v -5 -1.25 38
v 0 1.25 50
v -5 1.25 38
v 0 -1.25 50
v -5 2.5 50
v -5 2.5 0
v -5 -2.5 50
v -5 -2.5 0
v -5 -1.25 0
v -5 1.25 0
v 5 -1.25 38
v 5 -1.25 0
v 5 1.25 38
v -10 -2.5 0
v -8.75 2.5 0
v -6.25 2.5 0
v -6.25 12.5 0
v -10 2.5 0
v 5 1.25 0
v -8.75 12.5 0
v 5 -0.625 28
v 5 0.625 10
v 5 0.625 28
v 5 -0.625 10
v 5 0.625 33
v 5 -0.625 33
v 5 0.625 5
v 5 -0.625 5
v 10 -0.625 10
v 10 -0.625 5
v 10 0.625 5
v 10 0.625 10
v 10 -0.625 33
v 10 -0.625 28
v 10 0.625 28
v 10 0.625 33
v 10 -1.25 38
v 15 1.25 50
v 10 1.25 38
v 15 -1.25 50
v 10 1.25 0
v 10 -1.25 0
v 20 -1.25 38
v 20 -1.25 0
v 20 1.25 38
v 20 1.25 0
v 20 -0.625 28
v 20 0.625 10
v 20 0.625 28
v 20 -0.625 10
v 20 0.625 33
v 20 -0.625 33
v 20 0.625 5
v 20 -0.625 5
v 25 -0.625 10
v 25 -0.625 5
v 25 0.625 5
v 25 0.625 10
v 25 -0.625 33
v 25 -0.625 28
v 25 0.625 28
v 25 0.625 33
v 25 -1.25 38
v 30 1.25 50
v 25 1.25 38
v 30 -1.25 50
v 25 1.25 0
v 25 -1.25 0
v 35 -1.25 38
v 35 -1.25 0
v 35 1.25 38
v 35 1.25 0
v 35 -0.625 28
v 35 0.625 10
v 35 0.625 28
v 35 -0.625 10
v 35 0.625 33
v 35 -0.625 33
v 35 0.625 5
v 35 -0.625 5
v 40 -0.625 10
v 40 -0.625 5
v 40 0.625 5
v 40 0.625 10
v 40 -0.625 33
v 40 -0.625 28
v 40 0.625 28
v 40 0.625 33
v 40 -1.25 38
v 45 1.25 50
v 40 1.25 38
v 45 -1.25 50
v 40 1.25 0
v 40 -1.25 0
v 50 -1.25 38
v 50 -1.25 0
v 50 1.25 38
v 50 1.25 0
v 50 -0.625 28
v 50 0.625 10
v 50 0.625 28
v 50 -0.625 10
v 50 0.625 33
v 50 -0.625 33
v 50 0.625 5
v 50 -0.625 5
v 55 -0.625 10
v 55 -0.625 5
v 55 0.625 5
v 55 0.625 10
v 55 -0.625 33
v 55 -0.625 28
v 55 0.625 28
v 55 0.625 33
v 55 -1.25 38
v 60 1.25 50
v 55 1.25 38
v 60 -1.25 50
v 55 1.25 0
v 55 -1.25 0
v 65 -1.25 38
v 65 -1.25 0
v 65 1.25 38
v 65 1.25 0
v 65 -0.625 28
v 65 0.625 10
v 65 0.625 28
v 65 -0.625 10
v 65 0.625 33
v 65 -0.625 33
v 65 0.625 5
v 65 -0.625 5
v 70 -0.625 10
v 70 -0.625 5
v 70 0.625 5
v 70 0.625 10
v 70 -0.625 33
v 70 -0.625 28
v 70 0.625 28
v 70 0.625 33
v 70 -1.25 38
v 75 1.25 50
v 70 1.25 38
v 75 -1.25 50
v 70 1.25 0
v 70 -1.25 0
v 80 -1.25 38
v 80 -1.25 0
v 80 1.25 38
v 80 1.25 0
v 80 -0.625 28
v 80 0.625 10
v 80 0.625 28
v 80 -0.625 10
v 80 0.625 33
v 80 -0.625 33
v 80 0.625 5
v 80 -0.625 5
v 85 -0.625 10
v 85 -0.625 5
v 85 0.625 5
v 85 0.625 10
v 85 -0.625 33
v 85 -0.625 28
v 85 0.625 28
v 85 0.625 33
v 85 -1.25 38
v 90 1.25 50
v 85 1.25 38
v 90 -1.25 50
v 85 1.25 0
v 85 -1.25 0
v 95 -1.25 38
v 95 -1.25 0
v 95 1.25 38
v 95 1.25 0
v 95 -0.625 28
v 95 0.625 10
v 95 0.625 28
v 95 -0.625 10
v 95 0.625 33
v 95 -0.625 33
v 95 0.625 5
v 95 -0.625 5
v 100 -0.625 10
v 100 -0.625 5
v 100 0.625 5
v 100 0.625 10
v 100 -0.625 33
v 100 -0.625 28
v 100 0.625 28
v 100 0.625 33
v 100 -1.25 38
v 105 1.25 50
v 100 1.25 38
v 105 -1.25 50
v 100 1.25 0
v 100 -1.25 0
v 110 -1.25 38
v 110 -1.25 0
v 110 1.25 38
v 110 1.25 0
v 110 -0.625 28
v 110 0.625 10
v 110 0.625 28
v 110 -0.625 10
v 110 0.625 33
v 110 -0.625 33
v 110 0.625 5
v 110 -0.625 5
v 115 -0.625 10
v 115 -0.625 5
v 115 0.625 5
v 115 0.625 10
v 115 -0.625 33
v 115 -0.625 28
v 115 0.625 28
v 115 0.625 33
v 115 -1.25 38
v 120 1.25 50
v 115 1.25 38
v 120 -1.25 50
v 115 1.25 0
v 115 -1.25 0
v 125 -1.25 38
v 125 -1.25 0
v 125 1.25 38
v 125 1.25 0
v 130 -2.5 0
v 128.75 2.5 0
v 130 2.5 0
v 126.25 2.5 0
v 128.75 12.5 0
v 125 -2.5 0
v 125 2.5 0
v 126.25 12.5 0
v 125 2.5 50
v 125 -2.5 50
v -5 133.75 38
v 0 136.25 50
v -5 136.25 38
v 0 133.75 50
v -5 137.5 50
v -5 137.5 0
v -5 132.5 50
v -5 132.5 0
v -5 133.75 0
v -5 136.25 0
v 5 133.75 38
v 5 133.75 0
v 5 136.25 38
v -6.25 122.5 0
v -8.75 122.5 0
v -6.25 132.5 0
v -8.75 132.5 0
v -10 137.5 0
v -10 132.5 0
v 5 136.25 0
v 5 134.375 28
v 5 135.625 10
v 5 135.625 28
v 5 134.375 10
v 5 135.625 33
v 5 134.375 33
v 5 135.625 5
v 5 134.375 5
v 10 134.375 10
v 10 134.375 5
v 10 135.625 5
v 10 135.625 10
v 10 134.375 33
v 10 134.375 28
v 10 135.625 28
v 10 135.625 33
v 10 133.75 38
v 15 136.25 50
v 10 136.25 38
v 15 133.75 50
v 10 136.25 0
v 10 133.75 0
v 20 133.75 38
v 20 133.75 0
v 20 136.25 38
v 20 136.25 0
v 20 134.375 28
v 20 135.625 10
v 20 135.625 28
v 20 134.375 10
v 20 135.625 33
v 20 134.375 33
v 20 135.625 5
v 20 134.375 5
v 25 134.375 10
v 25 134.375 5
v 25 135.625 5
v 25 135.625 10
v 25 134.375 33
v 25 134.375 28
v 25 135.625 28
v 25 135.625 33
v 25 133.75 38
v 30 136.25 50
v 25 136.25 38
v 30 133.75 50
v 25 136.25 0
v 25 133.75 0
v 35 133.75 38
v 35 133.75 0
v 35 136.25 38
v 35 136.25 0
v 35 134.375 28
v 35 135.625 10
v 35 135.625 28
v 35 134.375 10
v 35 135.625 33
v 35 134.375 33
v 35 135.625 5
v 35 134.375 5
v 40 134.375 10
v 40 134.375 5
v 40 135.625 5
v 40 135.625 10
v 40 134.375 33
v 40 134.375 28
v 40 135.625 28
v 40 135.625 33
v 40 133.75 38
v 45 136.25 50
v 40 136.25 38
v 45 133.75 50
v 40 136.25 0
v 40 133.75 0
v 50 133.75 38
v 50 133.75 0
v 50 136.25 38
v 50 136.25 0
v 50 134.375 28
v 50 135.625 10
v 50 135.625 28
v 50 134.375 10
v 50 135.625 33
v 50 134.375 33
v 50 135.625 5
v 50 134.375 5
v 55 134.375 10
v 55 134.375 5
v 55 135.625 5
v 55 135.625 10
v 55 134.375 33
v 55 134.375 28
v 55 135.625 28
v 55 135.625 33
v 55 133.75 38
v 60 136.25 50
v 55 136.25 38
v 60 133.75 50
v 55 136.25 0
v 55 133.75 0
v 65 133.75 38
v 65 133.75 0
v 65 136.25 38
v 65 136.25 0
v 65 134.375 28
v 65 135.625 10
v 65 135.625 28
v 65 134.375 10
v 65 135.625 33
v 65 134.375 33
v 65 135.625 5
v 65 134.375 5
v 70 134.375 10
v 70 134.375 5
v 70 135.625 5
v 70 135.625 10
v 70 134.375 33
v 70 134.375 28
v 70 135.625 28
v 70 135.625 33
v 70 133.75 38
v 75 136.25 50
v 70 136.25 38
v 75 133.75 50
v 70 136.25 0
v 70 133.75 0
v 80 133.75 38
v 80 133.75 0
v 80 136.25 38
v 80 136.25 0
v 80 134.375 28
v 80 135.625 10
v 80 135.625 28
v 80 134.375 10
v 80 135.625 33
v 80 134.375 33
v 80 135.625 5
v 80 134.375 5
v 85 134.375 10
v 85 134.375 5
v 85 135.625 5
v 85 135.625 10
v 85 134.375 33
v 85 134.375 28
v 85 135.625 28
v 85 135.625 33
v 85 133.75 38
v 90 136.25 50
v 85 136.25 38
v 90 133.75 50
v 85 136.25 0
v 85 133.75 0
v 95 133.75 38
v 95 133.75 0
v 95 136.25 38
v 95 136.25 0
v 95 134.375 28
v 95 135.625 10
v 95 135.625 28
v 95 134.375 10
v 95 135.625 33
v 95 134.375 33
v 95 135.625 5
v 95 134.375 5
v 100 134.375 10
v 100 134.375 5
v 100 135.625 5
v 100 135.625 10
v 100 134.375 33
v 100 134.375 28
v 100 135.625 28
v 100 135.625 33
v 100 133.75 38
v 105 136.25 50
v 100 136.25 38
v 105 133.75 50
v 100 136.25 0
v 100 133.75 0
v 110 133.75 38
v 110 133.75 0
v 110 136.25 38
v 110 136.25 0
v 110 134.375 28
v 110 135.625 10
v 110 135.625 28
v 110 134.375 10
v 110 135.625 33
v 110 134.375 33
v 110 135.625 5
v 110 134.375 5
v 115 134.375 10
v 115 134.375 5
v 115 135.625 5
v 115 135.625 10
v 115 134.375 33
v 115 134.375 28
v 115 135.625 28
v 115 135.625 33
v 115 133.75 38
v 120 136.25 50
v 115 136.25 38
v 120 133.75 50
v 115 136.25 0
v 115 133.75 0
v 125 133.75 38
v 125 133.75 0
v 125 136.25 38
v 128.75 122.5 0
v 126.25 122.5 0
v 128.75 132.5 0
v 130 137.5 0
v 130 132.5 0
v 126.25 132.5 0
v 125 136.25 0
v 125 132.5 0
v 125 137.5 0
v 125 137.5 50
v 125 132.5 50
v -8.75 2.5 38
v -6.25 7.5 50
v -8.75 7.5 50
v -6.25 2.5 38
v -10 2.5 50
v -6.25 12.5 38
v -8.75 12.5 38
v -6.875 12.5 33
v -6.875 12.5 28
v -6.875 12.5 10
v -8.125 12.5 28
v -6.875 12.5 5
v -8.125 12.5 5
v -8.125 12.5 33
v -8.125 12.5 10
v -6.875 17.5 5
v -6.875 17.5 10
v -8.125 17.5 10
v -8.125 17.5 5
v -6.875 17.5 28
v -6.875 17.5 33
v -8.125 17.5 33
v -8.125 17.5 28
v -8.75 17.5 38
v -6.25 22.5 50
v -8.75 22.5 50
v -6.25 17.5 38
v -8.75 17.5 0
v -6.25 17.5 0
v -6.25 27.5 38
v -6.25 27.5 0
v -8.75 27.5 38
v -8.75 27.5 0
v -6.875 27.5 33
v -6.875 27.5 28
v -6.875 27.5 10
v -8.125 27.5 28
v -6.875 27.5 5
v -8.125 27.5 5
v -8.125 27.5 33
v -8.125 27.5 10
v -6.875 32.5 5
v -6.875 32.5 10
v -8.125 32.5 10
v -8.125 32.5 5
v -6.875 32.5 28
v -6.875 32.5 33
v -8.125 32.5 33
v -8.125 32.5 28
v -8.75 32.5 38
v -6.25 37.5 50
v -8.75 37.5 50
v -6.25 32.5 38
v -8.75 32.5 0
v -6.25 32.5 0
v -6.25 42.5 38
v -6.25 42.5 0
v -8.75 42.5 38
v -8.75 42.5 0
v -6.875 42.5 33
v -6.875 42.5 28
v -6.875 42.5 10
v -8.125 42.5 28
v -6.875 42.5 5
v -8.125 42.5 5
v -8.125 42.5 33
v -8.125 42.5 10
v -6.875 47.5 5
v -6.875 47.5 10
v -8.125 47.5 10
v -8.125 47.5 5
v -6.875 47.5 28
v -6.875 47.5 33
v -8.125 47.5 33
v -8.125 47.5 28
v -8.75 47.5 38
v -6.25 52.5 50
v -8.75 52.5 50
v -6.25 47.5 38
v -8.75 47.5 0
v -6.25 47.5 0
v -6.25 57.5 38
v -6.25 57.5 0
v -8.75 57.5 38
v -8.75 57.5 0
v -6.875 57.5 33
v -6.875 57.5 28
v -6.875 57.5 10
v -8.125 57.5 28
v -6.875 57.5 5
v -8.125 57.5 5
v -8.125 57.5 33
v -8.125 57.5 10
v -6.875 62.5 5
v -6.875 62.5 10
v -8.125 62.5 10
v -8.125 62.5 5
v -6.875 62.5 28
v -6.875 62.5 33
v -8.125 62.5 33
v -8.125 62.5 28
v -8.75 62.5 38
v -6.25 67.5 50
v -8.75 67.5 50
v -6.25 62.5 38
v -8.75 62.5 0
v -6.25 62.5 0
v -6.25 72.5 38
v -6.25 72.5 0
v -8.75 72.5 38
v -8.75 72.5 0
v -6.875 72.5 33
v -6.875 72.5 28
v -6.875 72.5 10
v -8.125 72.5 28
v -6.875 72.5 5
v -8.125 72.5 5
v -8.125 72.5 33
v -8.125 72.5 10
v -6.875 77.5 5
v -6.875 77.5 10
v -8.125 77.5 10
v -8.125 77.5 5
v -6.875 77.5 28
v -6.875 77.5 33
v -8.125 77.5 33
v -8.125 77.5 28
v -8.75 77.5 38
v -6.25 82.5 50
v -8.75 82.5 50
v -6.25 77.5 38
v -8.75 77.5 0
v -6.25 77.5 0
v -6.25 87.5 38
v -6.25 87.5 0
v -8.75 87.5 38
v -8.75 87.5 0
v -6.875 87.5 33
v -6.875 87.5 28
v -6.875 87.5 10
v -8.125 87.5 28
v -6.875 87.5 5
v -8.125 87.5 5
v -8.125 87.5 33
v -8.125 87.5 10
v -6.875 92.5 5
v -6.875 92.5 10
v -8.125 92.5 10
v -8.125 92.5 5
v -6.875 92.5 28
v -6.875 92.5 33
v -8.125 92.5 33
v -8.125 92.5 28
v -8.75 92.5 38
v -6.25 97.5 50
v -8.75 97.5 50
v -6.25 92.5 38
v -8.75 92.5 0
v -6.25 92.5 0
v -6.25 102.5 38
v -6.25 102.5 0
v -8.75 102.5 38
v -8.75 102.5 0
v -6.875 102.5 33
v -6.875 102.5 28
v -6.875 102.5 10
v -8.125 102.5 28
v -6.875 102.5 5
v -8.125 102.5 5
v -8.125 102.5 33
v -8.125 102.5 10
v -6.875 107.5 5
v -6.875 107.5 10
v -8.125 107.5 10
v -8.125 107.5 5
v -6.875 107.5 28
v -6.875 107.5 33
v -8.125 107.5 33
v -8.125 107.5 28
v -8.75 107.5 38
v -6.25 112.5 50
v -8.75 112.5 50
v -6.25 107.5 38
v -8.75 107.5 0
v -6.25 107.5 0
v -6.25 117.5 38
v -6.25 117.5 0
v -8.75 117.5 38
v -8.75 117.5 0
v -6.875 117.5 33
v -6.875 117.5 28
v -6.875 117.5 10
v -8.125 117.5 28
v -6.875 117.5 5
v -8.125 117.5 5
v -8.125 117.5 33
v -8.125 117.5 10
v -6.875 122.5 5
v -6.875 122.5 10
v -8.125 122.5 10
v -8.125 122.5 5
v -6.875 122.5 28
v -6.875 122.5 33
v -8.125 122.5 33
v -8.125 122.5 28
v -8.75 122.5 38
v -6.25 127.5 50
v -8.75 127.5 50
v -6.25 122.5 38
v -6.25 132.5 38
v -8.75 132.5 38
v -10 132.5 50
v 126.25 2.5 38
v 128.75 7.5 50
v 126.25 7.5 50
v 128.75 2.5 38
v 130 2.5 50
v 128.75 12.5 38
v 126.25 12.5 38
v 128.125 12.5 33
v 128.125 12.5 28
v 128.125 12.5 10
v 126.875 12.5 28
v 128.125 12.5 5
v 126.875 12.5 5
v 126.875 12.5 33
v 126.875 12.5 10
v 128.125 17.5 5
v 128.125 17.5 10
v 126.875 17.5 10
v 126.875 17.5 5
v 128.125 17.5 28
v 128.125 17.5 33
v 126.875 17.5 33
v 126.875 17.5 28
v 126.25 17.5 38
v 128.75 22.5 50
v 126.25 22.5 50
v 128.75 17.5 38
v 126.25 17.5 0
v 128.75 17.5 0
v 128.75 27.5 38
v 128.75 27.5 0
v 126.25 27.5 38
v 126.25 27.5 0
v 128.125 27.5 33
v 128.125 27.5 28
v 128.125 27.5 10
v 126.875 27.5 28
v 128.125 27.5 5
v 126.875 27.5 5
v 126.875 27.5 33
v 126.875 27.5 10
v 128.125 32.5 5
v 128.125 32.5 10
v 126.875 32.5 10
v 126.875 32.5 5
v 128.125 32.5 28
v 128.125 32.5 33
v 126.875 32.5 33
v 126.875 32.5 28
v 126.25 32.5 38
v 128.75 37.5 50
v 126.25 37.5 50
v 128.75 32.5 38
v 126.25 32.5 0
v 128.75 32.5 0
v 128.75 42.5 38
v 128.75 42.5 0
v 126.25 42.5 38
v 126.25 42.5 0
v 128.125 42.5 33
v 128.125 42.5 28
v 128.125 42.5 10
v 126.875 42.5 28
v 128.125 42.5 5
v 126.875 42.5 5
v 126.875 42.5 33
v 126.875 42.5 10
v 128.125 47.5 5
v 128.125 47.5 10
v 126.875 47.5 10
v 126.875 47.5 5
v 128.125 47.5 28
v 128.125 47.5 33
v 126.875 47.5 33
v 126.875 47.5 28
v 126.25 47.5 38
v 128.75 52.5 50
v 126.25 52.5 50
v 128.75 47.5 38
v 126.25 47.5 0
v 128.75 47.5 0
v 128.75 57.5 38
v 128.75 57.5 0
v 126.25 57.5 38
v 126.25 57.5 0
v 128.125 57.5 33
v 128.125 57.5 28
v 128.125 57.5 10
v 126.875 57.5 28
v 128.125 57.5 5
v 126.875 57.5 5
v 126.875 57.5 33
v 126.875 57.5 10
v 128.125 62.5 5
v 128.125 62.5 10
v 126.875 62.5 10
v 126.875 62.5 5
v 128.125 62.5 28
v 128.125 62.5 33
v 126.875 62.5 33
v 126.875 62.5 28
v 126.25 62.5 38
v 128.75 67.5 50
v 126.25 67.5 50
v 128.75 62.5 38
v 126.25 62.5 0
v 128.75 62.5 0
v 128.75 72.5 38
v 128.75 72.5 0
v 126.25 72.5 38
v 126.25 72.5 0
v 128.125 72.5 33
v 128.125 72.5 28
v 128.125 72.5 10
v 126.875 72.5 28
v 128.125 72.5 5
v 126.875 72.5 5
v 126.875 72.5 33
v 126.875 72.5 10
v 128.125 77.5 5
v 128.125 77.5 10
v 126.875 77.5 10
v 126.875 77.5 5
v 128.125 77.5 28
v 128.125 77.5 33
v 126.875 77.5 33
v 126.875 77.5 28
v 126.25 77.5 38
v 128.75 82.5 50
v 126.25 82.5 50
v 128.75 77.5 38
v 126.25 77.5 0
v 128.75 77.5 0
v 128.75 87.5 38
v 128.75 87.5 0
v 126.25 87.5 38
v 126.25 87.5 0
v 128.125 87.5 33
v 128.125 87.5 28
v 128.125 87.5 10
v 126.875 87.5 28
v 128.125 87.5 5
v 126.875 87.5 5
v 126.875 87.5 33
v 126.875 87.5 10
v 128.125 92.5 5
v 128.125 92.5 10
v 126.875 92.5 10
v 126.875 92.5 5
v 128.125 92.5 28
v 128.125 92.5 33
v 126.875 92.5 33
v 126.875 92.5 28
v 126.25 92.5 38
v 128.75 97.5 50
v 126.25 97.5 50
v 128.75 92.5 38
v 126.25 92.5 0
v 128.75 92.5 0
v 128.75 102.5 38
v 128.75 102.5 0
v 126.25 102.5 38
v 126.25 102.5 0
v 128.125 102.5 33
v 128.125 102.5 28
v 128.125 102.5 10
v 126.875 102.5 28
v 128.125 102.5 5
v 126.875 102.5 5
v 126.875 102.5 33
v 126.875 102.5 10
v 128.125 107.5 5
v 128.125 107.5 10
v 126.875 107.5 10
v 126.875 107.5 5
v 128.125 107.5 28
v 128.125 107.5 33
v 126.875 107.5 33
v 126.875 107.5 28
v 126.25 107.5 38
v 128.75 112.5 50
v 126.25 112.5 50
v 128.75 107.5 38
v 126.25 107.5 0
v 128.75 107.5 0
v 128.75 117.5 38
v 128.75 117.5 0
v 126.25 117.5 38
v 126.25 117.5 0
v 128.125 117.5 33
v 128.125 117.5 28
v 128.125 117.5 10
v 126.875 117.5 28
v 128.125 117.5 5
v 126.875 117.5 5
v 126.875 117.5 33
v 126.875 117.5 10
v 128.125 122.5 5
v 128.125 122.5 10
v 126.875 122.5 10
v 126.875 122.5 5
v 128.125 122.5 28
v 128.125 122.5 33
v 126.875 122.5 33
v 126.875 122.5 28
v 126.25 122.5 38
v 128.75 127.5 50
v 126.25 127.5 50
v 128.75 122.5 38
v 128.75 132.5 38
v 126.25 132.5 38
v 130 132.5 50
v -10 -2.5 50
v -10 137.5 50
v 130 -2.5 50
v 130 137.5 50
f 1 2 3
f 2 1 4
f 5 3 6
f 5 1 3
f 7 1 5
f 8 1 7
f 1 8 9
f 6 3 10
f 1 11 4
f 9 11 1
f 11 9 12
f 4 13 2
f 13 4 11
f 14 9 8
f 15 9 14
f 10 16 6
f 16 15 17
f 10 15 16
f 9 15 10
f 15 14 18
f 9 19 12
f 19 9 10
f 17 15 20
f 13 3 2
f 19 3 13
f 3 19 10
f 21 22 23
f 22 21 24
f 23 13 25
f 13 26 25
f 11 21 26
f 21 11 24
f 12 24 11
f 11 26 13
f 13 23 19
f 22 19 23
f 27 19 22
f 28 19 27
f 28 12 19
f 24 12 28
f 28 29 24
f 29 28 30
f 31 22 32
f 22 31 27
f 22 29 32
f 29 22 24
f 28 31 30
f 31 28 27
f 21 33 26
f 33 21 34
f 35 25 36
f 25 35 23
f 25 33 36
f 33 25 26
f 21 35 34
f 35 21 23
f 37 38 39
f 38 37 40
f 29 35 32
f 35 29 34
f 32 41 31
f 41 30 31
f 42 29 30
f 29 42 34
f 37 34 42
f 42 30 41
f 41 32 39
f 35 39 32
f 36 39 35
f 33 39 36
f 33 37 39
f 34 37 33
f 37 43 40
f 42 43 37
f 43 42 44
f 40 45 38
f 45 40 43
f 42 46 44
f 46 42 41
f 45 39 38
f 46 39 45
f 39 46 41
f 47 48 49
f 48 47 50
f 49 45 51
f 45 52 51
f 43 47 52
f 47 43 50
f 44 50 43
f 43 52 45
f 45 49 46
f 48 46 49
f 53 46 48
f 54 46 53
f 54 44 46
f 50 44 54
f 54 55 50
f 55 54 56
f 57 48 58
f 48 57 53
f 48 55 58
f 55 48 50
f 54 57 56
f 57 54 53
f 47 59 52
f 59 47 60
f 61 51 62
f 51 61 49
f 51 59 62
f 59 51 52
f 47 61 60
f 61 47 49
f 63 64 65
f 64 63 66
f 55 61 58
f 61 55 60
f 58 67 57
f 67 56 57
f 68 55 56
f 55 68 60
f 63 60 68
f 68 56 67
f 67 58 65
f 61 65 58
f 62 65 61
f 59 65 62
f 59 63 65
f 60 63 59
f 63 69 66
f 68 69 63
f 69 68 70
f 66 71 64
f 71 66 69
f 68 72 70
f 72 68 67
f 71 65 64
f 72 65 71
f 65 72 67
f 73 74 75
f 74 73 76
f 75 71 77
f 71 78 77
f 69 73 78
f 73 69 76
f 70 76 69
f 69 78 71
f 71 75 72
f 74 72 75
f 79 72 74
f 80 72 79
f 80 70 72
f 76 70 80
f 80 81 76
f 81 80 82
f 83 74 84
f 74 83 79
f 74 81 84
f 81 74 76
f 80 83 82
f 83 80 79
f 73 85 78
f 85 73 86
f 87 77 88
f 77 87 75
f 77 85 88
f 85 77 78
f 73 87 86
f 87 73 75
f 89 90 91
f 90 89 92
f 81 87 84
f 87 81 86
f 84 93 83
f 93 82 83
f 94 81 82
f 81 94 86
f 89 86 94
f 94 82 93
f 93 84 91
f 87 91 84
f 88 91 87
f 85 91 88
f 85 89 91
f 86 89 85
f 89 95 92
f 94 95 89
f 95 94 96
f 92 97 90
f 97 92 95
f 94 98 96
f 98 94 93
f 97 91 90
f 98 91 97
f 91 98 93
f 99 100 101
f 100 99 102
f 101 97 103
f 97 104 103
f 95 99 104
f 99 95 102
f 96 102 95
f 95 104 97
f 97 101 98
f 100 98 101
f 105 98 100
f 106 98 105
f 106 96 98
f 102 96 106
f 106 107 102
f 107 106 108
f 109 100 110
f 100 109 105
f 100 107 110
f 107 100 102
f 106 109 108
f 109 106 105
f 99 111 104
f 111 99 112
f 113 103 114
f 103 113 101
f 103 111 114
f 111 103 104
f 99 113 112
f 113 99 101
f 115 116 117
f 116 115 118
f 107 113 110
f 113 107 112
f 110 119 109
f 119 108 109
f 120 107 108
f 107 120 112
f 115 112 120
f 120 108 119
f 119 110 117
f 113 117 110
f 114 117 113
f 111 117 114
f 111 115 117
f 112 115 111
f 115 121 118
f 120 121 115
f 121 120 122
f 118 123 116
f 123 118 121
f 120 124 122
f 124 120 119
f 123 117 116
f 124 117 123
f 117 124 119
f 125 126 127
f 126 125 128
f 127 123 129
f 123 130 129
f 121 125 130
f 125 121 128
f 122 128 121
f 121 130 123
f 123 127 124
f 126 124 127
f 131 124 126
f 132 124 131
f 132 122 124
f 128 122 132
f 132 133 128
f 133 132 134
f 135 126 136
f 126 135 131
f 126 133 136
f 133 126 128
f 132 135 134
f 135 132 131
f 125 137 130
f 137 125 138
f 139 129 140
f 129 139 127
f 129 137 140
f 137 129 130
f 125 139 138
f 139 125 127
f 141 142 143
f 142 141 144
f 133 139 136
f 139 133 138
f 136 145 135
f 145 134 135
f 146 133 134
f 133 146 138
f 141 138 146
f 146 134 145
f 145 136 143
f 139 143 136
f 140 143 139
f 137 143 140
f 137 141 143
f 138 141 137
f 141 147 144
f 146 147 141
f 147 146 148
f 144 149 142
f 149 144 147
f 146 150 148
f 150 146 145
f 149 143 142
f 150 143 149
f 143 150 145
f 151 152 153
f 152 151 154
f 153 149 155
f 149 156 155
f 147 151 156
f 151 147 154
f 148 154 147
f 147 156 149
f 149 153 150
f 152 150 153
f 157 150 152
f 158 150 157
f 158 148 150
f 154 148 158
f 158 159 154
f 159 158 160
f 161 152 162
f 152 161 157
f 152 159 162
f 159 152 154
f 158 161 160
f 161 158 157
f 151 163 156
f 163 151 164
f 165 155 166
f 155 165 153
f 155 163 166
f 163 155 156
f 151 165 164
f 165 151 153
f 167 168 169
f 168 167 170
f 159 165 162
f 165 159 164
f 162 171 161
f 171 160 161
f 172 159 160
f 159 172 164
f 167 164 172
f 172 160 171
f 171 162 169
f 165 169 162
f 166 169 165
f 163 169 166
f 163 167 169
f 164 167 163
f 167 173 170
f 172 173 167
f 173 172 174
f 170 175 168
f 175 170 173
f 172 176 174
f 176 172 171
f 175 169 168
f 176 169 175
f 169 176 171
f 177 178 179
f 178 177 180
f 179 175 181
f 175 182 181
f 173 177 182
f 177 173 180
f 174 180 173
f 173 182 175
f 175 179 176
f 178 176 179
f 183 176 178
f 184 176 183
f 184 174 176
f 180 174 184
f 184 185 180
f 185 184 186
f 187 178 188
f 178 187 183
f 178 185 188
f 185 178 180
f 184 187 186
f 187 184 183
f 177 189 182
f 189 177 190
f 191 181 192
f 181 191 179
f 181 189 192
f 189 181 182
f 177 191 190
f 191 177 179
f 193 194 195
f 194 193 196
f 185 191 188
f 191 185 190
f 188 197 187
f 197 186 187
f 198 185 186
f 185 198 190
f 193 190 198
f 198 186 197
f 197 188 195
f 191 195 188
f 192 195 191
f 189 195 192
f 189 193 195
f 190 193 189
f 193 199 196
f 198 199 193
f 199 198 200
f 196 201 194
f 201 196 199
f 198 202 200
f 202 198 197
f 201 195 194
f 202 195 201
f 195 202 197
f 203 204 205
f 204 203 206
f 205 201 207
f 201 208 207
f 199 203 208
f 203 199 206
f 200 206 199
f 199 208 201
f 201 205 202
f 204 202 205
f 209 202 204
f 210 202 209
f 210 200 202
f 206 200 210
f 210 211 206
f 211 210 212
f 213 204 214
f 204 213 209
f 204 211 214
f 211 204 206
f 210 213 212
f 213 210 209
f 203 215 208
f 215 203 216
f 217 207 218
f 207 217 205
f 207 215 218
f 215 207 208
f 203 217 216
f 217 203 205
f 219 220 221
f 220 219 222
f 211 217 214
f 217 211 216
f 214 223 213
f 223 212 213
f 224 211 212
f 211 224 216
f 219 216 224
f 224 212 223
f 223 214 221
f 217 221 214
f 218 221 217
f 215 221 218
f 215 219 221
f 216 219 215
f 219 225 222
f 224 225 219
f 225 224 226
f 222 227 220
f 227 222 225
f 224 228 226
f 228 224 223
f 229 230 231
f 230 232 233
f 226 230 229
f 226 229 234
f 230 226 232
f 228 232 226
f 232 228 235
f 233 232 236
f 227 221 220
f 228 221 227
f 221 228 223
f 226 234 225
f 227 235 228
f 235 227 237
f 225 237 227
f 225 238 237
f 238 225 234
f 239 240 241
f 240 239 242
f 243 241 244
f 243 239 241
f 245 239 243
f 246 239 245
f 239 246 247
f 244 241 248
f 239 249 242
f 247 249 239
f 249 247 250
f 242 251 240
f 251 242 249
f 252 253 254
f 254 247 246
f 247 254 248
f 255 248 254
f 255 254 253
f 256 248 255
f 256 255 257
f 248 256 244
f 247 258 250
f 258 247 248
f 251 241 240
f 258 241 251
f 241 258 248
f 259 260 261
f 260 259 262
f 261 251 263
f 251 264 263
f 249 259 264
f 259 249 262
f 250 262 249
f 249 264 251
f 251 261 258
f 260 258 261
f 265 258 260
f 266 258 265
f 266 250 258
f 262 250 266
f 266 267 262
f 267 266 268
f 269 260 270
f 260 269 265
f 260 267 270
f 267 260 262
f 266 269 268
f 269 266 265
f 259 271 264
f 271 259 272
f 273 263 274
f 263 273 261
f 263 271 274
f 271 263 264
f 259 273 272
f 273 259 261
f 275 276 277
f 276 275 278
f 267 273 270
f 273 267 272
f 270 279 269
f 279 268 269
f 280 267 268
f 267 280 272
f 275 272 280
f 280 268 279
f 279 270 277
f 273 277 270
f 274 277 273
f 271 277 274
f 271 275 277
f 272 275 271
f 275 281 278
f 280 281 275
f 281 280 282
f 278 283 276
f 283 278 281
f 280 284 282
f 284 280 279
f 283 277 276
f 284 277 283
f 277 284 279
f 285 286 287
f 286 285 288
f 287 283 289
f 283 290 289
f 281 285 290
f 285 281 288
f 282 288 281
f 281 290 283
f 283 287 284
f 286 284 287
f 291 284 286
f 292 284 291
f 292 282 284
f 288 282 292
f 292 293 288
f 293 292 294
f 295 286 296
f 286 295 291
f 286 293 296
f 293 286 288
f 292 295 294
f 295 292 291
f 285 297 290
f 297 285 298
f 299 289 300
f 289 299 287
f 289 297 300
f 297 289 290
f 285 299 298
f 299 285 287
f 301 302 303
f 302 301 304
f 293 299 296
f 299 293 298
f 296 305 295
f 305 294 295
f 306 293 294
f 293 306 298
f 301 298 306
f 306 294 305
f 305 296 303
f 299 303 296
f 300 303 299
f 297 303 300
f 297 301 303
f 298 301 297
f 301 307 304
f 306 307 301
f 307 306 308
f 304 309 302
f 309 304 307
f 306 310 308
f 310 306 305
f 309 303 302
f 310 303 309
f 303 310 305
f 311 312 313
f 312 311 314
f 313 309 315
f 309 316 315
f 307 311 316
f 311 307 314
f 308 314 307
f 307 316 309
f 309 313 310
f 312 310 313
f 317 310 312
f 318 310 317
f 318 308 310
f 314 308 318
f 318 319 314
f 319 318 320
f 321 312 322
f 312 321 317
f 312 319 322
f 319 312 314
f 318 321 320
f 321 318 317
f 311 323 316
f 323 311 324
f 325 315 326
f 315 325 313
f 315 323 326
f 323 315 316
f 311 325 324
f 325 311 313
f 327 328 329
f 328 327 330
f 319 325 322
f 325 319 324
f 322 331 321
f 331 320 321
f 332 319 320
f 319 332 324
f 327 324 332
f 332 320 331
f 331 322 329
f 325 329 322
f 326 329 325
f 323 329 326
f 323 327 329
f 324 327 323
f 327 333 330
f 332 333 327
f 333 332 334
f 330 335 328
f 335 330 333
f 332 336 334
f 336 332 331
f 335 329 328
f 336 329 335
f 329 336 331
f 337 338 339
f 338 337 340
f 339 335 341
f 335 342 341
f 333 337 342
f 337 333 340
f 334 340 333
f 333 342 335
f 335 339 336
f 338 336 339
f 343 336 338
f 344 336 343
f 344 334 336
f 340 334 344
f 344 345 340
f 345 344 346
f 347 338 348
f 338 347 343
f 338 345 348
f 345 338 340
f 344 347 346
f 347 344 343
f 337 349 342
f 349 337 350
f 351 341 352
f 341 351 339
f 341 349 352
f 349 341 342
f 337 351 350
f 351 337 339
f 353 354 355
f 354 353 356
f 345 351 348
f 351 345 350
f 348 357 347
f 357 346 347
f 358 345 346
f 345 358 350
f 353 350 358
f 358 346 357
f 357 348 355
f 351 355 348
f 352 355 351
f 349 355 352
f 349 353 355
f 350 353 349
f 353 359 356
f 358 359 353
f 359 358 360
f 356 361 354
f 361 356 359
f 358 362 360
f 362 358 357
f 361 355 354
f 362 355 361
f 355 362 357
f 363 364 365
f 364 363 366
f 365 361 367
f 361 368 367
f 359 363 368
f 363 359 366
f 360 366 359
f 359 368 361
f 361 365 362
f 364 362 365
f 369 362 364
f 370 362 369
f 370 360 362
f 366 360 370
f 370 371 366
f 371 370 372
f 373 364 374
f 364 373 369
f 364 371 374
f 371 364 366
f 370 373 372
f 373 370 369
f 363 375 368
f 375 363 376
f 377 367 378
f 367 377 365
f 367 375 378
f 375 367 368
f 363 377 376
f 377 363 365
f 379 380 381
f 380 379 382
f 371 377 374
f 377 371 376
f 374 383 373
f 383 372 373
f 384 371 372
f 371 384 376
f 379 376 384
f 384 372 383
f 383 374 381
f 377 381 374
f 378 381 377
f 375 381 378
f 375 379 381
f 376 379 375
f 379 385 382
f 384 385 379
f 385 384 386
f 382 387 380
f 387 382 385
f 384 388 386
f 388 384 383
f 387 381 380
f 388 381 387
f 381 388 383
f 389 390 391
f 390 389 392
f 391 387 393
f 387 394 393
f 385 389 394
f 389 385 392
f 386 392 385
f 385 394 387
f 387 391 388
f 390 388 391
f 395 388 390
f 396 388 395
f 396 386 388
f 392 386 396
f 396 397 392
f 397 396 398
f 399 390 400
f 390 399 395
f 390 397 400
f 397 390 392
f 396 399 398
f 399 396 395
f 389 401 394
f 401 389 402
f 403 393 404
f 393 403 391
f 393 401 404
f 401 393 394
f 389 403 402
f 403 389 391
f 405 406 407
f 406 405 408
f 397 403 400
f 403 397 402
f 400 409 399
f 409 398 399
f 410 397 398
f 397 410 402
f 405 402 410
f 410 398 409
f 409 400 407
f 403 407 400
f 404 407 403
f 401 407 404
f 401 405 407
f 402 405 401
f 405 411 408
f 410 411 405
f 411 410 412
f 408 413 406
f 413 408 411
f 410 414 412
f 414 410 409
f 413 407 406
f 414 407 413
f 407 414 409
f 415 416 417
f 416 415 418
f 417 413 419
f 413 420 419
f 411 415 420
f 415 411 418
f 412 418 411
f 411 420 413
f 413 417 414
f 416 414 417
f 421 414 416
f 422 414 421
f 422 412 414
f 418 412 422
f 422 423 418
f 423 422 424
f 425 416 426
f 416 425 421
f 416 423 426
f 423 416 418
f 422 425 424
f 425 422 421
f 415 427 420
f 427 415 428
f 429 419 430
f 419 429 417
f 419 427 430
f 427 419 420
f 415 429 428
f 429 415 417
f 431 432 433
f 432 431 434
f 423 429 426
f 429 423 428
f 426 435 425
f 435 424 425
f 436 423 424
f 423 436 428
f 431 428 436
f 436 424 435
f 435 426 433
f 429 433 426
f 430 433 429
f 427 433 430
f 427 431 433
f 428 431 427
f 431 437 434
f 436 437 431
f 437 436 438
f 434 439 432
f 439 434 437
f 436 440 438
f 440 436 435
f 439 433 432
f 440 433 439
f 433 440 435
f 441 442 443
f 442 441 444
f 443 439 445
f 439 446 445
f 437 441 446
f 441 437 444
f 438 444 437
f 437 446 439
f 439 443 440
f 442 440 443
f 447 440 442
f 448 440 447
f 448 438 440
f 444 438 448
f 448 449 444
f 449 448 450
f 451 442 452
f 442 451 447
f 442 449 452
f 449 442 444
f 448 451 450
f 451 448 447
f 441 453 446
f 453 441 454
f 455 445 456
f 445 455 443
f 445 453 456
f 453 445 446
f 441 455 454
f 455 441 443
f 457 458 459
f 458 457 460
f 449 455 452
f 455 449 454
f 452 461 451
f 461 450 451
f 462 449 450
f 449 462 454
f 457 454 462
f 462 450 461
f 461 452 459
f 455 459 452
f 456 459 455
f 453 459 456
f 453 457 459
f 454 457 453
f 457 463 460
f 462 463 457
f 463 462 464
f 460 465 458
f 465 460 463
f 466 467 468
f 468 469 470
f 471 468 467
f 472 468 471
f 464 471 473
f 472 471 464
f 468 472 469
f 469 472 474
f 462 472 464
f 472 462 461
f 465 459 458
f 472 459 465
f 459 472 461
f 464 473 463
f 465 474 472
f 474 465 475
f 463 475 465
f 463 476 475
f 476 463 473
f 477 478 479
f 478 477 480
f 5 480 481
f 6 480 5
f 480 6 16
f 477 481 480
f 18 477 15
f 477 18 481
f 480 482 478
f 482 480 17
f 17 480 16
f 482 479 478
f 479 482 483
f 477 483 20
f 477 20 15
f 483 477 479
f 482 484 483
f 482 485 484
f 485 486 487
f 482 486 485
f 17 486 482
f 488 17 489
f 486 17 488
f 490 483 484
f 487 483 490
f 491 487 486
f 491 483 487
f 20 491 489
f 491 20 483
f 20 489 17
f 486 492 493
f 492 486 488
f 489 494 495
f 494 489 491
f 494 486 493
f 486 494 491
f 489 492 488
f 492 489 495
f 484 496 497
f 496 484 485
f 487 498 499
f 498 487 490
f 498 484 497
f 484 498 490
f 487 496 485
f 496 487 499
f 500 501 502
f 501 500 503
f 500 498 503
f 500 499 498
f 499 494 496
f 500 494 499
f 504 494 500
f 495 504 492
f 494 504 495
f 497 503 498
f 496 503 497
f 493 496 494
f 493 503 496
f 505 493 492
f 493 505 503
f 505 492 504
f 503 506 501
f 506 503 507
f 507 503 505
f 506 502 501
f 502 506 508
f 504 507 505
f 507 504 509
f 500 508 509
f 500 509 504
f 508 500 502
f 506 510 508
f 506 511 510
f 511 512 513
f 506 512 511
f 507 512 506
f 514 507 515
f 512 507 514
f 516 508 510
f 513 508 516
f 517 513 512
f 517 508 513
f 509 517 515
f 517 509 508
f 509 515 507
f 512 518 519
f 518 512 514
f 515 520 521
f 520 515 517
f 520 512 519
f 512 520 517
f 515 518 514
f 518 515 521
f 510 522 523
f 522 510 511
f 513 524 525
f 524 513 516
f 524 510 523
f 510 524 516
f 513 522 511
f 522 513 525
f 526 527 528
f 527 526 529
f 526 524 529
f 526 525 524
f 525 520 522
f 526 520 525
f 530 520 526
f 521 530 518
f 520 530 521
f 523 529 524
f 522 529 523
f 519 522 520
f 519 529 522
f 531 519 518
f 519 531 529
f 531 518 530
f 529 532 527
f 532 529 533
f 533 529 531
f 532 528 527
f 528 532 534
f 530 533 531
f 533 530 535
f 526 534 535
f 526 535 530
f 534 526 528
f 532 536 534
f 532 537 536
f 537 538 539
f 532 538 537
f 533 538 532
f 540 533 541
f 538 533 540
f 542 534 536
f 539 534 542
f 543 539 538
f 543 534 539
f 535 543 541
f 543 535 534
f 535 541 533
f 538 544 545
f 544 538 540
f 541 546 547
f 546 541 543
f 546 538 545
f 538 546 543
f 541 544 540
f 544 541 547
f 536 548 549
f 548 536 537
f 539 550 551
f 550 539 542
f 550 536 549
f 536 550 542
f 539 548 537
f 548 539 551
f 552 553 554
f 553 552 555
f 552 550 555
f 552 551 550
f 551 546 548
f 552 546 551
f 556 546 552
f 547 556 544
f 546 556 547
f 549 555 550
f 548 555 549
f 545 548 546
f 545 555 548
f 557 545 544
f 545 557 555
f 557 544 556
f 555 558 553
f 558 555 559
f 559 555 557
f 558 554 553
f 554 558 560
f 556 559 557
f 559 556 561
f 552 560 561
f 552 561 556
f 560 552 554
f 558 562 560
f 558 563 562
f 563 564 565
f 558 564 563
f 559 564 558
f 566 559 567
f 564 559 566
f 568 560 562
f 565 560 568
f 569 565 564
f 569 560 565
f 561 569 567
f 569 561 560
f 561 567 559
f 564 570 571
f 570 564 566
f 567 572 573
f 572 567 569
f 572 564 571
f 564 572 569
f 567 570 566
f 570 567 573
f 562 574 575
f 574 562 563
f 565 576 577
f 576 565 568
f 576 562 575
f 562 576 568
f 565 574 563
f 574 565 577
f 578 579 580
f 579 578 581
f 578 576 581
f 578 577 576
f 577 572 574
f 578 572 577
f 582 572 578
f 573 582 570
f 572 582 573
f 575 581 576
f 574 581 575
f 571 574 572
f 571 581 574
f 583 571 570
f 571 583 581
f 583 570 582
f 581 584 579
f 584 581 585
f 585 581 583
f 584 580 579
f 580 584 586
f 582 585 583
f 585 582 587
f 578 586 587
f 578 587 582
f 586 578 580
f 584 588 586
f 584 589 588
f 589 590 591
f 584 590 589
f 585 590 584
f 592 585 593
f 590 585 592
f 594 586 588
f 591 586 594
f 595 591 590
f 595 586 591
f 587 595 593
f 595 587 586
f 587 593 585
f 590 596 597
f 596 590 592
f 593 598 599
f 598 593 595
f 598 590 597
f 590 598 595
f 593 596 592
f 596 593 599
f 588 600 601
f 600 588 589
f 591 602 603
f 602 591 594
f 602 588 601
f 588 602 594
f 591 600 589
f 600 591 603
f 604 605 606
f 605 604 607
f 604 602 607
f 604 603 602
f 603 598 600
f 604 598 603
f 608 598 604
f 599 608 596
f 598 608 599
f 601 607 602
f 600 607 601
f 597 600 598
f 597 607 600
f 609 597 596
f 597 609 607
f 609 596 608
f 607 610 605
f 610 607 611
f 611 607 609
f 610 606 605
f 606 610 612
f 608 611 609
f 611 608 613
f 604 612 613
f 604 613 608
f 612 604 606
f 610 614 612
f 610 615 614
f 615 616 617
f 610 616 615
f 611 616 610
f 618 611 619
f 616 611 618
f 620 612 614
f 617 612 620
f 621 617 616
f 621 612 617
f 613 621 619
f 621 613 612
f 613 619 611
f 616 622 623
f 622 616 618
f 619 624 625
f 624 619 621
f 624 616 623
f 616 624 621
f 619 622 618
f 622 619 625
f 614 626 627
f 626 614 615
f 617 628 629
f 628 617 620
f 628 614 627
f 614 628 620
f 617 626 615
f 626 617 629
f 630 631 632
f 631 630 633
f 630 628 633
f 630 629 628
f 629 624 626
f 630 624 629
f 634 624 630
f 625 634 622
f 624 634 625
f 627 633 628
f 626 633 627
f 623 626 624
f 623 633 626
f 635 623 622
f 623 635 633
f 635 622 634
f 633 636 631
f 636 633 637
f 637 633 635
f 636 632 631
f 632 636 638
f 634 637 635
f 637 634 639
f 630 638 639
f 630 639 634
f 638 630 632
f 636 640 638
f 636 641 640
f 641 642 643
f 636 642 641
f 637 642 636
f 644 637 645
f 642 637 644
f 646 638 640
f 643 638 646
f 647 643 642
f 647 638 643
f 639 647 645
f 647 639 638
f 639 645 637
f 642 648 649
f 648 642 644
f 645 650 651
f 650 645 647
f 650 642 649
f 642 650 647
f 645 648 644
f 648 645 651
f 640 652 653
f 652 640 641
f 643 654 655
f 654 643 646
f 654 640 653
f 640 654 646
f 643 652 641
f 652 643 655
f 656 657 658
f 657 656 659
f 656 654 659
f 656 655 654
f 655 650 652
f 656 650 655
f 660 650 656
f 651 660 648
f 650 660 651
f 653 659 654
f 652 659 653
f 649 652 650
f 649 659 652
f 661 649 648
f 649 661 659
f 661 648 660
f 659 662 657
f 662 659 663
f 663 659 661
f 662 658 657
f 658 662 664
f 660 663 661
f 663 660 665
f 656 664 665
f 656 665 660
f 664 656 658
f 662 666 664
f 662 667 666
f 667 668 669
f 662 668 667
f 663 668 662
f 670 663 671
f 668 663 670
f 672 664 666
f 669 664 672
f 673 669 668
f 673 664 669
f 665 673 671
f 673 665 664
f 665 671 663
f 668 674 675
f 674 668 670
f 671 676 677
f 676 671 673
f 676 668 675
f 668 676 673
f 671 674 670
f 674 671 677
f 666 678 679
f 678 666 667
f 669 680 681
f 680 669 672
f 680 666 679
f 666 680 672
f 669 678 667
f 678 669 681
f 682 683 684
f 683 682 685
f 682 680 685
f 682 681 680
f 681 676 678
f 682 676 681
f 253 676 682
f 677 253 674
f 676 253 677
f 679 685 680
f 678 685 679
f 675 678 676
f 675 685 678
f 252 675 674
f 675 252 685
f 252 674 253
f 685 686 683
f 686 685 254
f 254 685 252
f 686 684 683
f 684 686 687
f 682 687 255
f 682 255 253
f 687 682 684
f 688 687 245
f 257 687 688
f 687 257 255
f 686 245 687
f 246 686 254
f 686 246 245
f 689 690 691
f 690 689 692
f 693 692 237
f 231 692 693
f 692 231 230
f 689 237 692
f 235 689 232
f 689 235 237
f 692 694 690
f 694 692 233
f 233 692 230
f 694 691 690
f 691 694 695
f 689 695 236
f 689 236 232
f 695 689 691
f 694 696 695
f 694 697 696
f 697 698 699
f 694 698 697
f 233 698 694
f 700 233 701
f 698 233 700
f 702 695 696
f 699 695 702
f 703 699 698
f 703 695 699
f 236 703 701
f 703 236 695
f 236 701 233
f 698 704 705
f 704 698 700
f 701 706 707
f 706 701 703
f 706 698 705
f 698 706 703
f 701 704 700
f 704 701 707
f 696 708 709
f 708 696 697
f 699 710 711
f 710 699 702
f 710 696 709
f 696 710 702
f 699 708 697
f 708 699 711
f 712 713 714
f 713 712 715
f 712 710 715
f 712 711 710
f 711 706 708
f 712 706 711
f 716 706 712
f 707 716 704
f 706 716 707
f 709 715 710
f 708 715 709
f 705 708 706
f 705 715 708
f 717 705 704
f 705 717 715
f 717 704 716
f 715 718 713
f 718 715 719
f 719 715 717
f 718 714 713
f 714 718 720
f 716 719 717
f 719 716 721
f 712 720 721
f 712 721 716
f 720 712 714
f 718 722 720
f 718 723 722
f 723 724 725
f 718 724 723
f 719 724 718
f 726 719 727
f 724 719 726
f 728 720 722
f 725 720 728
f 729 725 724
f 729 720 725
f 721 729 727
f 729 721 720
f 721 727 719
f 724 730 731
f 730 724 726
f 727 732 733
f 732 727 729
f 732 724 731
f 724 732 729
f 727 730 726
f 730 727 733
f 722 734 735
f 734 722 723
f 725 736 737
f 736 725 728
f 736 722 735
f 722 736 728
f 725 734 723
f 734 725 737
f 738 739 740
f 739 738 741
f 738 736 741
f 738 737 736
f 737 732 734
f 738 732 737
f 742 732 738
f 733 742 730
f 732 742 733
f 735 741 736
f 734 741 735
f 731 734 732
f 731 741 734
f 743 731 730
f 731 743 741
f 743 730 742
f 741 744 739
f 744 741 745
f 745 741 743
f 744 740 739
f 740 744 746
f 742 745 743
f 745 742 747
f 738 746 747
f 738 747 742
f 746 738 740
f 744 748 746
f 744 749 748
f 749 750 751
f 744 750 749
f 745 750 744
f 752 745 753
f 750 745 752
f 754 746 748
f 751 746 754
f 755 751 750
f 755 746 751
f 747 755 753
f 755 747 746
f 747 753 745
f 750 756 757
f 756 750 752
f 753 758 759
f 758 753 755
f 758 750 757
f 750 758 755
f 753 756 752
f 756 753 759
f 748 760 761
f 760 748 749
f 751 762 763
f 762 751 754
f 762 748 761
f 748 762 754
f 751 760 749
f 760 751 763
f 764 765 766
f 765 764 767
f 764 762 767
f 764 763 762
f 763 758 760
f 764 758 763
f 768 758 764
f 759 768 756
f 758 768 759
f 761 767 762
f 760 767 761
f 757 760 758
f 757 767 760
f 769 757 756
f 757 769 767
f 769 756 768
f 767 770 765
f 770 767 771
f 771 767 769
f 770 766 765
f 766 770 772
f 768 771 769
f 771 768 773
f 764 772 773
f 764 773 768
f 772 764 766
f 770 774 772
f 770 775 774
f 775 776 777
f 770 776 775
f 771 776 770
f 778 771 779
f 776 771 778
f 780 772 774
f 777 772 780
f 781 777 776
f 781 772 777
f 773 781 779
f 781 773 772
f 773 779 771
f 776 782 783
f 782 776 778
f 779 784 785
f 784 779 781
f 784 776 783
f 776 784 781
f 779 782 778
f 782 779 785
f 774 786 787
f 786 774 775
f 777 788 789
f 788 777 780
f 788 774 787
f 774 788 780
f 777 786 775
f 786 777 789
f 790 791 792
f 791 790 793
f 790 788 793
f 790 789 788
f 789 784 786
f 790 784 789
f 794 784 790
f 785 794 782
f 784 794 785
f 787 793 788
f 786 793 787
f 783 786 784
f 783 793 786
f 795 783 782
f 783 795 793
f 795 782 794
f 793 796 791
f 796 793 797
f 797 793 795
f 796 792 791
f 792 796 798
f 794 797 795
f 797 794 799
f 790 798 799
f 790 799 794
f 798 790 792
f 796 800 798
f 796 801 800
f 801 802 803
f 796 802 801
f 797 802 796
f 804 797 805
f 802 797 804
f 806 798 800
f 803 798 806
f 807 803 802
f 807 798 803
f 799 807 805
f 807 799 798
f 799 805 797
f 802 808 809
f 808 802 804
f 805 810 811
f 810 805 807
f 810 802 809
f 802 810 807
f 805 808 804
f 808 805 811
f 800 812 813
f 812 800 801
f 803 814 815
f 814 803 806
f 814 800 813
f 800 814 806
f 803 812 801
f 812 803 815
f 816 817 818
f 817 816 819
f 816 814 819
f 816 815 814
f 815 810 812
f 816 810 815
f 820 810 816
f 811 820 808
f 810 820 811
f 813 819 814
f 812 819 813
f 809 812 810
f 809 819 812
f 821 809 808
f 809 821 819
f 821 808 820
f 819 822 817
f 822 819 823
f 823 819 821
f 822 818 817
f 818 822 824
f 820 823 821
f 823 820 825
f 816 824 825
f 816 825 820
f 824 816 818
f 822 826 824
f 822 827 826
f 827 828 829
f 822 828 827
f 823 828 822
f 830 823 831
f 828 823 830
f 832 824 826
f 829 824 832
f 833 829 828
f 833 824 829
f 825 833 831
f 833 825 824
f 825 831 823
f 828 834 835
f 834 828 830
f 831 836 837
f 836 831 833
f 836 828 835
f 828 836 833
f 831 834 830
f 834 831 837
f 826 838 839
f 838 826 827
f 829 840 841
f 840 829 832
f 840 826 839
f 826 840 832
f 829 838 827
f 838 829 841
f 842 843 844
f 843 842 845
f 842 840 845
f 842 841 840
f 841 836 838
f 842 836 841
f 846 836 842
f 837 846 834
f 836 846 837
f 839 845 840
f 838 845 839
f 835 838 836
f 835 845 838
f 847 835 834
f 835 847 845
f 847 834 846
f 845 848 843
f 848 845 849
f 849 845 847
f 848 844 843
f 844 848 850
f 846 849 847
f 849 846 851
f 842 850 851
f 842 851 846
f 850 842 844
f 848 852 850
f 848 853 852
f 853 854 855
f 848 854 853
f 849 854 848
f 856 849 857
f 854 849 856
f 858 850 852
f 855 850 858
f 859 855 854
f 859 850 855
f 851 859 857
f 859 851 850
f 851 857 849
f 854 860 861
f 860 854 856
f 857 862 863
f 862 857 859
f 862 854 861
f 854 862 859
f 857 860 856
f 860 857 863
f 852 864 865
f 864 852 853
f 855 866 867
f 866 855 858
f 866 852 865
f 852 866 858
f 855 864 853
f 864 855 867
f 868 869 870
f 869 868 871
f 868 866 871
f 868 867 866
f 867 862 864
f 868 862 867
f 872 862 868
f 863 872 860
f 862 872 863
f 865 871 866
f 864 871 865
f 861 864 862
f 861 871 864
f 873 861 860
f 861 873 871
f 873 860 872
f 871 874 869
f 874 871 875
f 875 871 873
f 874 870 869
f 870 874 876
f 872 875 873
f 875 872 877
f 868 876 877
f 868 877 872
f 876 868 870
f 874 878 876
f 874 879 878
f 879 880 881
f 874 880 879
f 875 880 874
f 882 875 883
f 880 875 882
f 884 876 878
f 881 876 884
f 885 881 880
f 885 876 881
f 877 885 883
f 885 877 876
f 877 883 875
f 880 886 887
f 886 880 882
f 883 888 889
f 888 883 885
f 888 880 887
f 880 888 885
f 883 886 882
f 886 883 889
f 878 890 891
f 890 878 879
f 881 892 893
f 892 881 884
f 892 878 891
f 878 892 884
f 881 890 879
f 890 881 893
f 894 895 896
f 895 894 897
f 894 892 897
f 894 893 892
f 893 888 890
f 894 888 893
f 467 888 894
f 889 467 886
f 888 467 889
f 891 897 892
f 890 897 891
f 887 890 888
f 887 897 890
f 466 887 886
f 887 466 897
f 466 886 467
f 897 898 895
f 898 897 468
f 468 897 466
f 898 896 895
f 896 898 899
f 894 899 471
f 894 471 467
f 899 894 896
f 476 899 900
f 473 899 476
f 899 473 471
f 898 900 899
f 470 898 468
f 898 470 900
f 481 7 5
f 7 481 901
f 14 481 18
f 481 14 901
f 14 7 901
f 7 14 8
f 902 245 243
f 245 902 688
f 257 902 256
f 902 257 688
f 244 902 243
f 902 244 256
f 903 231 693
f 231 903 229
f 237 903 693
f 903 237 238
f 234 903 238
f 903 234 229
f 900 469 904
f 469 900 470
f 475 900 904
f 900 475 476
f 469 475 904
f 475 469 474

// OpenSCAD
//Keep your 3D prints corralled within a nice picket fence.
//Input your printer's build size, and have a corral generated for you!

//Written by Brandon Pomeroy at intentional3D

/* [Select Your Printer Bed Size] */

// in mm. This should be slightly smaller than your max build length.
corralLength = 140;

//in mm. This should be sligthly smaller than your max build width
corralWidth = 140;

/* [Hidden] */
fencePostWidth = 10;
fencePostTaperHeight = 12;
fencePostHeight = 50;
fencePostThickness = 2.5;
fencePostSpacing = 5;

lengthNumberOfPosts = floor(corralLength/(fencePostSpacing+fencePostWidth));
widthNumberOfPosts = floor(corralWidth/(fencePostSpacing+fencePostWidth));
halfPostWidth = (fencePostWidth + fencePostSpacing)/2;

//echo(lengthNumberOfPosts);
//echo(widthNumberOfPosts);



module fencePost(x,y,z, thickness, spacing){
	cubeLength = x + spacing;
	union(){
		linear_extrude(height = thickness, center = true, convexity = 10, twist = 0)
			translate([-x/2, 0, 0])
			polygon(points = [[0,0], [x,0], [x,z-y], [x/2,z], [0,z-y]], paths = [[0,1,2,3,4]]);

		translate([-(x+spacing)/2, spacing, -thickness/4])
			cube([cubeLength, 5, thickness/2], center = false);

		translate([-(x+spacing)/2, z-y-(spacing*2), -thickness/4])
			cube([cubeLength, 5, thickness/2], center = false);
		
	}
}

module fenceLine(spacing, postWidth, length){
	numberOfPosts = floor(length/(spacing+postWidth));
	//echo(numberOfPosts);
	//echo(numberOfPosts*(spacing+postWidth));
	for( i = [1 : 1 : numberOfPosts] ) {
		translate([(spacing+postWidth)*(i-1), 0, 0])
		fencePost(fencePostWidth, fencePostTaperHeight, fencePostHeight, fencePostThickness,fencePostSpacing);
	}
}

module cornerPosts() {
	//First find the corner coordinates

	bottomLeft = [-halfPostWidth, 0, fencePostHeight/2];
	bottomRight = [lengthNumberOfPosts * (fencePostWidth+fencePostSpacing) - halfPostWidth, 0 , fencePostHeight/2];
	topLeft = [-halfPostWidth, widthNumberOfPosts * (fencePostWidth+fencePostSpacing), fencePostHeight/2];
	topRight = [lengthNumberOfPosts * (fencePostWidth+fencePostSpacing) - halfPostWidth, widthNumberOfPosts * (fencePostWidth+fencePostSpacing) , fencePostHeight/2];

	translate(bottomLeft)
		cube([fencePostSpacing,fencePostSpacing,fencePostHeight], center = true);
	translate(topLeft)
		cube([fencePostSpacing,fencePostSpacing,fencePostHeight], center = true);
	translate(bottomRight)
		cube([fencePostSpacing,fencePostSpacing,fencePostHeight], center = true);
	translate(topRight)
		cube([fencePostSpacing,fencePostSpacing,fencePostHeight], center = true);

}


module corral(){
	union(){
		translate([0,0,0])
			rotate([90,0,0])
			fenceLine(fencePostSpacing, fencePostWidth, corralLength);
	
		
		translate([0, widthNumberOfPosts * (fencePostWidth+fencePostSpacing),0])
			rotate([90,0,0])
			fenceLine(fencePostSpacing, fencePostWidth, corralLength);
	
		translate([-halfPostWidth, halfPostWidth , 0])
			rotate([90,0,90])
			fenceLine(fencePostSpacing, fencePostWidth, corralWidth);
	
		translate([lengthNumberOfPosts * (fencePostWidth+fencePostSpacing) - halfPostWidth, halfPostWidth , 0])
			rotate([90,0,90])
			fenceLine(fencePostSpacing, fencePostWidth, corralWidth);
	}

	cornerPosts();
	
}



corral();
